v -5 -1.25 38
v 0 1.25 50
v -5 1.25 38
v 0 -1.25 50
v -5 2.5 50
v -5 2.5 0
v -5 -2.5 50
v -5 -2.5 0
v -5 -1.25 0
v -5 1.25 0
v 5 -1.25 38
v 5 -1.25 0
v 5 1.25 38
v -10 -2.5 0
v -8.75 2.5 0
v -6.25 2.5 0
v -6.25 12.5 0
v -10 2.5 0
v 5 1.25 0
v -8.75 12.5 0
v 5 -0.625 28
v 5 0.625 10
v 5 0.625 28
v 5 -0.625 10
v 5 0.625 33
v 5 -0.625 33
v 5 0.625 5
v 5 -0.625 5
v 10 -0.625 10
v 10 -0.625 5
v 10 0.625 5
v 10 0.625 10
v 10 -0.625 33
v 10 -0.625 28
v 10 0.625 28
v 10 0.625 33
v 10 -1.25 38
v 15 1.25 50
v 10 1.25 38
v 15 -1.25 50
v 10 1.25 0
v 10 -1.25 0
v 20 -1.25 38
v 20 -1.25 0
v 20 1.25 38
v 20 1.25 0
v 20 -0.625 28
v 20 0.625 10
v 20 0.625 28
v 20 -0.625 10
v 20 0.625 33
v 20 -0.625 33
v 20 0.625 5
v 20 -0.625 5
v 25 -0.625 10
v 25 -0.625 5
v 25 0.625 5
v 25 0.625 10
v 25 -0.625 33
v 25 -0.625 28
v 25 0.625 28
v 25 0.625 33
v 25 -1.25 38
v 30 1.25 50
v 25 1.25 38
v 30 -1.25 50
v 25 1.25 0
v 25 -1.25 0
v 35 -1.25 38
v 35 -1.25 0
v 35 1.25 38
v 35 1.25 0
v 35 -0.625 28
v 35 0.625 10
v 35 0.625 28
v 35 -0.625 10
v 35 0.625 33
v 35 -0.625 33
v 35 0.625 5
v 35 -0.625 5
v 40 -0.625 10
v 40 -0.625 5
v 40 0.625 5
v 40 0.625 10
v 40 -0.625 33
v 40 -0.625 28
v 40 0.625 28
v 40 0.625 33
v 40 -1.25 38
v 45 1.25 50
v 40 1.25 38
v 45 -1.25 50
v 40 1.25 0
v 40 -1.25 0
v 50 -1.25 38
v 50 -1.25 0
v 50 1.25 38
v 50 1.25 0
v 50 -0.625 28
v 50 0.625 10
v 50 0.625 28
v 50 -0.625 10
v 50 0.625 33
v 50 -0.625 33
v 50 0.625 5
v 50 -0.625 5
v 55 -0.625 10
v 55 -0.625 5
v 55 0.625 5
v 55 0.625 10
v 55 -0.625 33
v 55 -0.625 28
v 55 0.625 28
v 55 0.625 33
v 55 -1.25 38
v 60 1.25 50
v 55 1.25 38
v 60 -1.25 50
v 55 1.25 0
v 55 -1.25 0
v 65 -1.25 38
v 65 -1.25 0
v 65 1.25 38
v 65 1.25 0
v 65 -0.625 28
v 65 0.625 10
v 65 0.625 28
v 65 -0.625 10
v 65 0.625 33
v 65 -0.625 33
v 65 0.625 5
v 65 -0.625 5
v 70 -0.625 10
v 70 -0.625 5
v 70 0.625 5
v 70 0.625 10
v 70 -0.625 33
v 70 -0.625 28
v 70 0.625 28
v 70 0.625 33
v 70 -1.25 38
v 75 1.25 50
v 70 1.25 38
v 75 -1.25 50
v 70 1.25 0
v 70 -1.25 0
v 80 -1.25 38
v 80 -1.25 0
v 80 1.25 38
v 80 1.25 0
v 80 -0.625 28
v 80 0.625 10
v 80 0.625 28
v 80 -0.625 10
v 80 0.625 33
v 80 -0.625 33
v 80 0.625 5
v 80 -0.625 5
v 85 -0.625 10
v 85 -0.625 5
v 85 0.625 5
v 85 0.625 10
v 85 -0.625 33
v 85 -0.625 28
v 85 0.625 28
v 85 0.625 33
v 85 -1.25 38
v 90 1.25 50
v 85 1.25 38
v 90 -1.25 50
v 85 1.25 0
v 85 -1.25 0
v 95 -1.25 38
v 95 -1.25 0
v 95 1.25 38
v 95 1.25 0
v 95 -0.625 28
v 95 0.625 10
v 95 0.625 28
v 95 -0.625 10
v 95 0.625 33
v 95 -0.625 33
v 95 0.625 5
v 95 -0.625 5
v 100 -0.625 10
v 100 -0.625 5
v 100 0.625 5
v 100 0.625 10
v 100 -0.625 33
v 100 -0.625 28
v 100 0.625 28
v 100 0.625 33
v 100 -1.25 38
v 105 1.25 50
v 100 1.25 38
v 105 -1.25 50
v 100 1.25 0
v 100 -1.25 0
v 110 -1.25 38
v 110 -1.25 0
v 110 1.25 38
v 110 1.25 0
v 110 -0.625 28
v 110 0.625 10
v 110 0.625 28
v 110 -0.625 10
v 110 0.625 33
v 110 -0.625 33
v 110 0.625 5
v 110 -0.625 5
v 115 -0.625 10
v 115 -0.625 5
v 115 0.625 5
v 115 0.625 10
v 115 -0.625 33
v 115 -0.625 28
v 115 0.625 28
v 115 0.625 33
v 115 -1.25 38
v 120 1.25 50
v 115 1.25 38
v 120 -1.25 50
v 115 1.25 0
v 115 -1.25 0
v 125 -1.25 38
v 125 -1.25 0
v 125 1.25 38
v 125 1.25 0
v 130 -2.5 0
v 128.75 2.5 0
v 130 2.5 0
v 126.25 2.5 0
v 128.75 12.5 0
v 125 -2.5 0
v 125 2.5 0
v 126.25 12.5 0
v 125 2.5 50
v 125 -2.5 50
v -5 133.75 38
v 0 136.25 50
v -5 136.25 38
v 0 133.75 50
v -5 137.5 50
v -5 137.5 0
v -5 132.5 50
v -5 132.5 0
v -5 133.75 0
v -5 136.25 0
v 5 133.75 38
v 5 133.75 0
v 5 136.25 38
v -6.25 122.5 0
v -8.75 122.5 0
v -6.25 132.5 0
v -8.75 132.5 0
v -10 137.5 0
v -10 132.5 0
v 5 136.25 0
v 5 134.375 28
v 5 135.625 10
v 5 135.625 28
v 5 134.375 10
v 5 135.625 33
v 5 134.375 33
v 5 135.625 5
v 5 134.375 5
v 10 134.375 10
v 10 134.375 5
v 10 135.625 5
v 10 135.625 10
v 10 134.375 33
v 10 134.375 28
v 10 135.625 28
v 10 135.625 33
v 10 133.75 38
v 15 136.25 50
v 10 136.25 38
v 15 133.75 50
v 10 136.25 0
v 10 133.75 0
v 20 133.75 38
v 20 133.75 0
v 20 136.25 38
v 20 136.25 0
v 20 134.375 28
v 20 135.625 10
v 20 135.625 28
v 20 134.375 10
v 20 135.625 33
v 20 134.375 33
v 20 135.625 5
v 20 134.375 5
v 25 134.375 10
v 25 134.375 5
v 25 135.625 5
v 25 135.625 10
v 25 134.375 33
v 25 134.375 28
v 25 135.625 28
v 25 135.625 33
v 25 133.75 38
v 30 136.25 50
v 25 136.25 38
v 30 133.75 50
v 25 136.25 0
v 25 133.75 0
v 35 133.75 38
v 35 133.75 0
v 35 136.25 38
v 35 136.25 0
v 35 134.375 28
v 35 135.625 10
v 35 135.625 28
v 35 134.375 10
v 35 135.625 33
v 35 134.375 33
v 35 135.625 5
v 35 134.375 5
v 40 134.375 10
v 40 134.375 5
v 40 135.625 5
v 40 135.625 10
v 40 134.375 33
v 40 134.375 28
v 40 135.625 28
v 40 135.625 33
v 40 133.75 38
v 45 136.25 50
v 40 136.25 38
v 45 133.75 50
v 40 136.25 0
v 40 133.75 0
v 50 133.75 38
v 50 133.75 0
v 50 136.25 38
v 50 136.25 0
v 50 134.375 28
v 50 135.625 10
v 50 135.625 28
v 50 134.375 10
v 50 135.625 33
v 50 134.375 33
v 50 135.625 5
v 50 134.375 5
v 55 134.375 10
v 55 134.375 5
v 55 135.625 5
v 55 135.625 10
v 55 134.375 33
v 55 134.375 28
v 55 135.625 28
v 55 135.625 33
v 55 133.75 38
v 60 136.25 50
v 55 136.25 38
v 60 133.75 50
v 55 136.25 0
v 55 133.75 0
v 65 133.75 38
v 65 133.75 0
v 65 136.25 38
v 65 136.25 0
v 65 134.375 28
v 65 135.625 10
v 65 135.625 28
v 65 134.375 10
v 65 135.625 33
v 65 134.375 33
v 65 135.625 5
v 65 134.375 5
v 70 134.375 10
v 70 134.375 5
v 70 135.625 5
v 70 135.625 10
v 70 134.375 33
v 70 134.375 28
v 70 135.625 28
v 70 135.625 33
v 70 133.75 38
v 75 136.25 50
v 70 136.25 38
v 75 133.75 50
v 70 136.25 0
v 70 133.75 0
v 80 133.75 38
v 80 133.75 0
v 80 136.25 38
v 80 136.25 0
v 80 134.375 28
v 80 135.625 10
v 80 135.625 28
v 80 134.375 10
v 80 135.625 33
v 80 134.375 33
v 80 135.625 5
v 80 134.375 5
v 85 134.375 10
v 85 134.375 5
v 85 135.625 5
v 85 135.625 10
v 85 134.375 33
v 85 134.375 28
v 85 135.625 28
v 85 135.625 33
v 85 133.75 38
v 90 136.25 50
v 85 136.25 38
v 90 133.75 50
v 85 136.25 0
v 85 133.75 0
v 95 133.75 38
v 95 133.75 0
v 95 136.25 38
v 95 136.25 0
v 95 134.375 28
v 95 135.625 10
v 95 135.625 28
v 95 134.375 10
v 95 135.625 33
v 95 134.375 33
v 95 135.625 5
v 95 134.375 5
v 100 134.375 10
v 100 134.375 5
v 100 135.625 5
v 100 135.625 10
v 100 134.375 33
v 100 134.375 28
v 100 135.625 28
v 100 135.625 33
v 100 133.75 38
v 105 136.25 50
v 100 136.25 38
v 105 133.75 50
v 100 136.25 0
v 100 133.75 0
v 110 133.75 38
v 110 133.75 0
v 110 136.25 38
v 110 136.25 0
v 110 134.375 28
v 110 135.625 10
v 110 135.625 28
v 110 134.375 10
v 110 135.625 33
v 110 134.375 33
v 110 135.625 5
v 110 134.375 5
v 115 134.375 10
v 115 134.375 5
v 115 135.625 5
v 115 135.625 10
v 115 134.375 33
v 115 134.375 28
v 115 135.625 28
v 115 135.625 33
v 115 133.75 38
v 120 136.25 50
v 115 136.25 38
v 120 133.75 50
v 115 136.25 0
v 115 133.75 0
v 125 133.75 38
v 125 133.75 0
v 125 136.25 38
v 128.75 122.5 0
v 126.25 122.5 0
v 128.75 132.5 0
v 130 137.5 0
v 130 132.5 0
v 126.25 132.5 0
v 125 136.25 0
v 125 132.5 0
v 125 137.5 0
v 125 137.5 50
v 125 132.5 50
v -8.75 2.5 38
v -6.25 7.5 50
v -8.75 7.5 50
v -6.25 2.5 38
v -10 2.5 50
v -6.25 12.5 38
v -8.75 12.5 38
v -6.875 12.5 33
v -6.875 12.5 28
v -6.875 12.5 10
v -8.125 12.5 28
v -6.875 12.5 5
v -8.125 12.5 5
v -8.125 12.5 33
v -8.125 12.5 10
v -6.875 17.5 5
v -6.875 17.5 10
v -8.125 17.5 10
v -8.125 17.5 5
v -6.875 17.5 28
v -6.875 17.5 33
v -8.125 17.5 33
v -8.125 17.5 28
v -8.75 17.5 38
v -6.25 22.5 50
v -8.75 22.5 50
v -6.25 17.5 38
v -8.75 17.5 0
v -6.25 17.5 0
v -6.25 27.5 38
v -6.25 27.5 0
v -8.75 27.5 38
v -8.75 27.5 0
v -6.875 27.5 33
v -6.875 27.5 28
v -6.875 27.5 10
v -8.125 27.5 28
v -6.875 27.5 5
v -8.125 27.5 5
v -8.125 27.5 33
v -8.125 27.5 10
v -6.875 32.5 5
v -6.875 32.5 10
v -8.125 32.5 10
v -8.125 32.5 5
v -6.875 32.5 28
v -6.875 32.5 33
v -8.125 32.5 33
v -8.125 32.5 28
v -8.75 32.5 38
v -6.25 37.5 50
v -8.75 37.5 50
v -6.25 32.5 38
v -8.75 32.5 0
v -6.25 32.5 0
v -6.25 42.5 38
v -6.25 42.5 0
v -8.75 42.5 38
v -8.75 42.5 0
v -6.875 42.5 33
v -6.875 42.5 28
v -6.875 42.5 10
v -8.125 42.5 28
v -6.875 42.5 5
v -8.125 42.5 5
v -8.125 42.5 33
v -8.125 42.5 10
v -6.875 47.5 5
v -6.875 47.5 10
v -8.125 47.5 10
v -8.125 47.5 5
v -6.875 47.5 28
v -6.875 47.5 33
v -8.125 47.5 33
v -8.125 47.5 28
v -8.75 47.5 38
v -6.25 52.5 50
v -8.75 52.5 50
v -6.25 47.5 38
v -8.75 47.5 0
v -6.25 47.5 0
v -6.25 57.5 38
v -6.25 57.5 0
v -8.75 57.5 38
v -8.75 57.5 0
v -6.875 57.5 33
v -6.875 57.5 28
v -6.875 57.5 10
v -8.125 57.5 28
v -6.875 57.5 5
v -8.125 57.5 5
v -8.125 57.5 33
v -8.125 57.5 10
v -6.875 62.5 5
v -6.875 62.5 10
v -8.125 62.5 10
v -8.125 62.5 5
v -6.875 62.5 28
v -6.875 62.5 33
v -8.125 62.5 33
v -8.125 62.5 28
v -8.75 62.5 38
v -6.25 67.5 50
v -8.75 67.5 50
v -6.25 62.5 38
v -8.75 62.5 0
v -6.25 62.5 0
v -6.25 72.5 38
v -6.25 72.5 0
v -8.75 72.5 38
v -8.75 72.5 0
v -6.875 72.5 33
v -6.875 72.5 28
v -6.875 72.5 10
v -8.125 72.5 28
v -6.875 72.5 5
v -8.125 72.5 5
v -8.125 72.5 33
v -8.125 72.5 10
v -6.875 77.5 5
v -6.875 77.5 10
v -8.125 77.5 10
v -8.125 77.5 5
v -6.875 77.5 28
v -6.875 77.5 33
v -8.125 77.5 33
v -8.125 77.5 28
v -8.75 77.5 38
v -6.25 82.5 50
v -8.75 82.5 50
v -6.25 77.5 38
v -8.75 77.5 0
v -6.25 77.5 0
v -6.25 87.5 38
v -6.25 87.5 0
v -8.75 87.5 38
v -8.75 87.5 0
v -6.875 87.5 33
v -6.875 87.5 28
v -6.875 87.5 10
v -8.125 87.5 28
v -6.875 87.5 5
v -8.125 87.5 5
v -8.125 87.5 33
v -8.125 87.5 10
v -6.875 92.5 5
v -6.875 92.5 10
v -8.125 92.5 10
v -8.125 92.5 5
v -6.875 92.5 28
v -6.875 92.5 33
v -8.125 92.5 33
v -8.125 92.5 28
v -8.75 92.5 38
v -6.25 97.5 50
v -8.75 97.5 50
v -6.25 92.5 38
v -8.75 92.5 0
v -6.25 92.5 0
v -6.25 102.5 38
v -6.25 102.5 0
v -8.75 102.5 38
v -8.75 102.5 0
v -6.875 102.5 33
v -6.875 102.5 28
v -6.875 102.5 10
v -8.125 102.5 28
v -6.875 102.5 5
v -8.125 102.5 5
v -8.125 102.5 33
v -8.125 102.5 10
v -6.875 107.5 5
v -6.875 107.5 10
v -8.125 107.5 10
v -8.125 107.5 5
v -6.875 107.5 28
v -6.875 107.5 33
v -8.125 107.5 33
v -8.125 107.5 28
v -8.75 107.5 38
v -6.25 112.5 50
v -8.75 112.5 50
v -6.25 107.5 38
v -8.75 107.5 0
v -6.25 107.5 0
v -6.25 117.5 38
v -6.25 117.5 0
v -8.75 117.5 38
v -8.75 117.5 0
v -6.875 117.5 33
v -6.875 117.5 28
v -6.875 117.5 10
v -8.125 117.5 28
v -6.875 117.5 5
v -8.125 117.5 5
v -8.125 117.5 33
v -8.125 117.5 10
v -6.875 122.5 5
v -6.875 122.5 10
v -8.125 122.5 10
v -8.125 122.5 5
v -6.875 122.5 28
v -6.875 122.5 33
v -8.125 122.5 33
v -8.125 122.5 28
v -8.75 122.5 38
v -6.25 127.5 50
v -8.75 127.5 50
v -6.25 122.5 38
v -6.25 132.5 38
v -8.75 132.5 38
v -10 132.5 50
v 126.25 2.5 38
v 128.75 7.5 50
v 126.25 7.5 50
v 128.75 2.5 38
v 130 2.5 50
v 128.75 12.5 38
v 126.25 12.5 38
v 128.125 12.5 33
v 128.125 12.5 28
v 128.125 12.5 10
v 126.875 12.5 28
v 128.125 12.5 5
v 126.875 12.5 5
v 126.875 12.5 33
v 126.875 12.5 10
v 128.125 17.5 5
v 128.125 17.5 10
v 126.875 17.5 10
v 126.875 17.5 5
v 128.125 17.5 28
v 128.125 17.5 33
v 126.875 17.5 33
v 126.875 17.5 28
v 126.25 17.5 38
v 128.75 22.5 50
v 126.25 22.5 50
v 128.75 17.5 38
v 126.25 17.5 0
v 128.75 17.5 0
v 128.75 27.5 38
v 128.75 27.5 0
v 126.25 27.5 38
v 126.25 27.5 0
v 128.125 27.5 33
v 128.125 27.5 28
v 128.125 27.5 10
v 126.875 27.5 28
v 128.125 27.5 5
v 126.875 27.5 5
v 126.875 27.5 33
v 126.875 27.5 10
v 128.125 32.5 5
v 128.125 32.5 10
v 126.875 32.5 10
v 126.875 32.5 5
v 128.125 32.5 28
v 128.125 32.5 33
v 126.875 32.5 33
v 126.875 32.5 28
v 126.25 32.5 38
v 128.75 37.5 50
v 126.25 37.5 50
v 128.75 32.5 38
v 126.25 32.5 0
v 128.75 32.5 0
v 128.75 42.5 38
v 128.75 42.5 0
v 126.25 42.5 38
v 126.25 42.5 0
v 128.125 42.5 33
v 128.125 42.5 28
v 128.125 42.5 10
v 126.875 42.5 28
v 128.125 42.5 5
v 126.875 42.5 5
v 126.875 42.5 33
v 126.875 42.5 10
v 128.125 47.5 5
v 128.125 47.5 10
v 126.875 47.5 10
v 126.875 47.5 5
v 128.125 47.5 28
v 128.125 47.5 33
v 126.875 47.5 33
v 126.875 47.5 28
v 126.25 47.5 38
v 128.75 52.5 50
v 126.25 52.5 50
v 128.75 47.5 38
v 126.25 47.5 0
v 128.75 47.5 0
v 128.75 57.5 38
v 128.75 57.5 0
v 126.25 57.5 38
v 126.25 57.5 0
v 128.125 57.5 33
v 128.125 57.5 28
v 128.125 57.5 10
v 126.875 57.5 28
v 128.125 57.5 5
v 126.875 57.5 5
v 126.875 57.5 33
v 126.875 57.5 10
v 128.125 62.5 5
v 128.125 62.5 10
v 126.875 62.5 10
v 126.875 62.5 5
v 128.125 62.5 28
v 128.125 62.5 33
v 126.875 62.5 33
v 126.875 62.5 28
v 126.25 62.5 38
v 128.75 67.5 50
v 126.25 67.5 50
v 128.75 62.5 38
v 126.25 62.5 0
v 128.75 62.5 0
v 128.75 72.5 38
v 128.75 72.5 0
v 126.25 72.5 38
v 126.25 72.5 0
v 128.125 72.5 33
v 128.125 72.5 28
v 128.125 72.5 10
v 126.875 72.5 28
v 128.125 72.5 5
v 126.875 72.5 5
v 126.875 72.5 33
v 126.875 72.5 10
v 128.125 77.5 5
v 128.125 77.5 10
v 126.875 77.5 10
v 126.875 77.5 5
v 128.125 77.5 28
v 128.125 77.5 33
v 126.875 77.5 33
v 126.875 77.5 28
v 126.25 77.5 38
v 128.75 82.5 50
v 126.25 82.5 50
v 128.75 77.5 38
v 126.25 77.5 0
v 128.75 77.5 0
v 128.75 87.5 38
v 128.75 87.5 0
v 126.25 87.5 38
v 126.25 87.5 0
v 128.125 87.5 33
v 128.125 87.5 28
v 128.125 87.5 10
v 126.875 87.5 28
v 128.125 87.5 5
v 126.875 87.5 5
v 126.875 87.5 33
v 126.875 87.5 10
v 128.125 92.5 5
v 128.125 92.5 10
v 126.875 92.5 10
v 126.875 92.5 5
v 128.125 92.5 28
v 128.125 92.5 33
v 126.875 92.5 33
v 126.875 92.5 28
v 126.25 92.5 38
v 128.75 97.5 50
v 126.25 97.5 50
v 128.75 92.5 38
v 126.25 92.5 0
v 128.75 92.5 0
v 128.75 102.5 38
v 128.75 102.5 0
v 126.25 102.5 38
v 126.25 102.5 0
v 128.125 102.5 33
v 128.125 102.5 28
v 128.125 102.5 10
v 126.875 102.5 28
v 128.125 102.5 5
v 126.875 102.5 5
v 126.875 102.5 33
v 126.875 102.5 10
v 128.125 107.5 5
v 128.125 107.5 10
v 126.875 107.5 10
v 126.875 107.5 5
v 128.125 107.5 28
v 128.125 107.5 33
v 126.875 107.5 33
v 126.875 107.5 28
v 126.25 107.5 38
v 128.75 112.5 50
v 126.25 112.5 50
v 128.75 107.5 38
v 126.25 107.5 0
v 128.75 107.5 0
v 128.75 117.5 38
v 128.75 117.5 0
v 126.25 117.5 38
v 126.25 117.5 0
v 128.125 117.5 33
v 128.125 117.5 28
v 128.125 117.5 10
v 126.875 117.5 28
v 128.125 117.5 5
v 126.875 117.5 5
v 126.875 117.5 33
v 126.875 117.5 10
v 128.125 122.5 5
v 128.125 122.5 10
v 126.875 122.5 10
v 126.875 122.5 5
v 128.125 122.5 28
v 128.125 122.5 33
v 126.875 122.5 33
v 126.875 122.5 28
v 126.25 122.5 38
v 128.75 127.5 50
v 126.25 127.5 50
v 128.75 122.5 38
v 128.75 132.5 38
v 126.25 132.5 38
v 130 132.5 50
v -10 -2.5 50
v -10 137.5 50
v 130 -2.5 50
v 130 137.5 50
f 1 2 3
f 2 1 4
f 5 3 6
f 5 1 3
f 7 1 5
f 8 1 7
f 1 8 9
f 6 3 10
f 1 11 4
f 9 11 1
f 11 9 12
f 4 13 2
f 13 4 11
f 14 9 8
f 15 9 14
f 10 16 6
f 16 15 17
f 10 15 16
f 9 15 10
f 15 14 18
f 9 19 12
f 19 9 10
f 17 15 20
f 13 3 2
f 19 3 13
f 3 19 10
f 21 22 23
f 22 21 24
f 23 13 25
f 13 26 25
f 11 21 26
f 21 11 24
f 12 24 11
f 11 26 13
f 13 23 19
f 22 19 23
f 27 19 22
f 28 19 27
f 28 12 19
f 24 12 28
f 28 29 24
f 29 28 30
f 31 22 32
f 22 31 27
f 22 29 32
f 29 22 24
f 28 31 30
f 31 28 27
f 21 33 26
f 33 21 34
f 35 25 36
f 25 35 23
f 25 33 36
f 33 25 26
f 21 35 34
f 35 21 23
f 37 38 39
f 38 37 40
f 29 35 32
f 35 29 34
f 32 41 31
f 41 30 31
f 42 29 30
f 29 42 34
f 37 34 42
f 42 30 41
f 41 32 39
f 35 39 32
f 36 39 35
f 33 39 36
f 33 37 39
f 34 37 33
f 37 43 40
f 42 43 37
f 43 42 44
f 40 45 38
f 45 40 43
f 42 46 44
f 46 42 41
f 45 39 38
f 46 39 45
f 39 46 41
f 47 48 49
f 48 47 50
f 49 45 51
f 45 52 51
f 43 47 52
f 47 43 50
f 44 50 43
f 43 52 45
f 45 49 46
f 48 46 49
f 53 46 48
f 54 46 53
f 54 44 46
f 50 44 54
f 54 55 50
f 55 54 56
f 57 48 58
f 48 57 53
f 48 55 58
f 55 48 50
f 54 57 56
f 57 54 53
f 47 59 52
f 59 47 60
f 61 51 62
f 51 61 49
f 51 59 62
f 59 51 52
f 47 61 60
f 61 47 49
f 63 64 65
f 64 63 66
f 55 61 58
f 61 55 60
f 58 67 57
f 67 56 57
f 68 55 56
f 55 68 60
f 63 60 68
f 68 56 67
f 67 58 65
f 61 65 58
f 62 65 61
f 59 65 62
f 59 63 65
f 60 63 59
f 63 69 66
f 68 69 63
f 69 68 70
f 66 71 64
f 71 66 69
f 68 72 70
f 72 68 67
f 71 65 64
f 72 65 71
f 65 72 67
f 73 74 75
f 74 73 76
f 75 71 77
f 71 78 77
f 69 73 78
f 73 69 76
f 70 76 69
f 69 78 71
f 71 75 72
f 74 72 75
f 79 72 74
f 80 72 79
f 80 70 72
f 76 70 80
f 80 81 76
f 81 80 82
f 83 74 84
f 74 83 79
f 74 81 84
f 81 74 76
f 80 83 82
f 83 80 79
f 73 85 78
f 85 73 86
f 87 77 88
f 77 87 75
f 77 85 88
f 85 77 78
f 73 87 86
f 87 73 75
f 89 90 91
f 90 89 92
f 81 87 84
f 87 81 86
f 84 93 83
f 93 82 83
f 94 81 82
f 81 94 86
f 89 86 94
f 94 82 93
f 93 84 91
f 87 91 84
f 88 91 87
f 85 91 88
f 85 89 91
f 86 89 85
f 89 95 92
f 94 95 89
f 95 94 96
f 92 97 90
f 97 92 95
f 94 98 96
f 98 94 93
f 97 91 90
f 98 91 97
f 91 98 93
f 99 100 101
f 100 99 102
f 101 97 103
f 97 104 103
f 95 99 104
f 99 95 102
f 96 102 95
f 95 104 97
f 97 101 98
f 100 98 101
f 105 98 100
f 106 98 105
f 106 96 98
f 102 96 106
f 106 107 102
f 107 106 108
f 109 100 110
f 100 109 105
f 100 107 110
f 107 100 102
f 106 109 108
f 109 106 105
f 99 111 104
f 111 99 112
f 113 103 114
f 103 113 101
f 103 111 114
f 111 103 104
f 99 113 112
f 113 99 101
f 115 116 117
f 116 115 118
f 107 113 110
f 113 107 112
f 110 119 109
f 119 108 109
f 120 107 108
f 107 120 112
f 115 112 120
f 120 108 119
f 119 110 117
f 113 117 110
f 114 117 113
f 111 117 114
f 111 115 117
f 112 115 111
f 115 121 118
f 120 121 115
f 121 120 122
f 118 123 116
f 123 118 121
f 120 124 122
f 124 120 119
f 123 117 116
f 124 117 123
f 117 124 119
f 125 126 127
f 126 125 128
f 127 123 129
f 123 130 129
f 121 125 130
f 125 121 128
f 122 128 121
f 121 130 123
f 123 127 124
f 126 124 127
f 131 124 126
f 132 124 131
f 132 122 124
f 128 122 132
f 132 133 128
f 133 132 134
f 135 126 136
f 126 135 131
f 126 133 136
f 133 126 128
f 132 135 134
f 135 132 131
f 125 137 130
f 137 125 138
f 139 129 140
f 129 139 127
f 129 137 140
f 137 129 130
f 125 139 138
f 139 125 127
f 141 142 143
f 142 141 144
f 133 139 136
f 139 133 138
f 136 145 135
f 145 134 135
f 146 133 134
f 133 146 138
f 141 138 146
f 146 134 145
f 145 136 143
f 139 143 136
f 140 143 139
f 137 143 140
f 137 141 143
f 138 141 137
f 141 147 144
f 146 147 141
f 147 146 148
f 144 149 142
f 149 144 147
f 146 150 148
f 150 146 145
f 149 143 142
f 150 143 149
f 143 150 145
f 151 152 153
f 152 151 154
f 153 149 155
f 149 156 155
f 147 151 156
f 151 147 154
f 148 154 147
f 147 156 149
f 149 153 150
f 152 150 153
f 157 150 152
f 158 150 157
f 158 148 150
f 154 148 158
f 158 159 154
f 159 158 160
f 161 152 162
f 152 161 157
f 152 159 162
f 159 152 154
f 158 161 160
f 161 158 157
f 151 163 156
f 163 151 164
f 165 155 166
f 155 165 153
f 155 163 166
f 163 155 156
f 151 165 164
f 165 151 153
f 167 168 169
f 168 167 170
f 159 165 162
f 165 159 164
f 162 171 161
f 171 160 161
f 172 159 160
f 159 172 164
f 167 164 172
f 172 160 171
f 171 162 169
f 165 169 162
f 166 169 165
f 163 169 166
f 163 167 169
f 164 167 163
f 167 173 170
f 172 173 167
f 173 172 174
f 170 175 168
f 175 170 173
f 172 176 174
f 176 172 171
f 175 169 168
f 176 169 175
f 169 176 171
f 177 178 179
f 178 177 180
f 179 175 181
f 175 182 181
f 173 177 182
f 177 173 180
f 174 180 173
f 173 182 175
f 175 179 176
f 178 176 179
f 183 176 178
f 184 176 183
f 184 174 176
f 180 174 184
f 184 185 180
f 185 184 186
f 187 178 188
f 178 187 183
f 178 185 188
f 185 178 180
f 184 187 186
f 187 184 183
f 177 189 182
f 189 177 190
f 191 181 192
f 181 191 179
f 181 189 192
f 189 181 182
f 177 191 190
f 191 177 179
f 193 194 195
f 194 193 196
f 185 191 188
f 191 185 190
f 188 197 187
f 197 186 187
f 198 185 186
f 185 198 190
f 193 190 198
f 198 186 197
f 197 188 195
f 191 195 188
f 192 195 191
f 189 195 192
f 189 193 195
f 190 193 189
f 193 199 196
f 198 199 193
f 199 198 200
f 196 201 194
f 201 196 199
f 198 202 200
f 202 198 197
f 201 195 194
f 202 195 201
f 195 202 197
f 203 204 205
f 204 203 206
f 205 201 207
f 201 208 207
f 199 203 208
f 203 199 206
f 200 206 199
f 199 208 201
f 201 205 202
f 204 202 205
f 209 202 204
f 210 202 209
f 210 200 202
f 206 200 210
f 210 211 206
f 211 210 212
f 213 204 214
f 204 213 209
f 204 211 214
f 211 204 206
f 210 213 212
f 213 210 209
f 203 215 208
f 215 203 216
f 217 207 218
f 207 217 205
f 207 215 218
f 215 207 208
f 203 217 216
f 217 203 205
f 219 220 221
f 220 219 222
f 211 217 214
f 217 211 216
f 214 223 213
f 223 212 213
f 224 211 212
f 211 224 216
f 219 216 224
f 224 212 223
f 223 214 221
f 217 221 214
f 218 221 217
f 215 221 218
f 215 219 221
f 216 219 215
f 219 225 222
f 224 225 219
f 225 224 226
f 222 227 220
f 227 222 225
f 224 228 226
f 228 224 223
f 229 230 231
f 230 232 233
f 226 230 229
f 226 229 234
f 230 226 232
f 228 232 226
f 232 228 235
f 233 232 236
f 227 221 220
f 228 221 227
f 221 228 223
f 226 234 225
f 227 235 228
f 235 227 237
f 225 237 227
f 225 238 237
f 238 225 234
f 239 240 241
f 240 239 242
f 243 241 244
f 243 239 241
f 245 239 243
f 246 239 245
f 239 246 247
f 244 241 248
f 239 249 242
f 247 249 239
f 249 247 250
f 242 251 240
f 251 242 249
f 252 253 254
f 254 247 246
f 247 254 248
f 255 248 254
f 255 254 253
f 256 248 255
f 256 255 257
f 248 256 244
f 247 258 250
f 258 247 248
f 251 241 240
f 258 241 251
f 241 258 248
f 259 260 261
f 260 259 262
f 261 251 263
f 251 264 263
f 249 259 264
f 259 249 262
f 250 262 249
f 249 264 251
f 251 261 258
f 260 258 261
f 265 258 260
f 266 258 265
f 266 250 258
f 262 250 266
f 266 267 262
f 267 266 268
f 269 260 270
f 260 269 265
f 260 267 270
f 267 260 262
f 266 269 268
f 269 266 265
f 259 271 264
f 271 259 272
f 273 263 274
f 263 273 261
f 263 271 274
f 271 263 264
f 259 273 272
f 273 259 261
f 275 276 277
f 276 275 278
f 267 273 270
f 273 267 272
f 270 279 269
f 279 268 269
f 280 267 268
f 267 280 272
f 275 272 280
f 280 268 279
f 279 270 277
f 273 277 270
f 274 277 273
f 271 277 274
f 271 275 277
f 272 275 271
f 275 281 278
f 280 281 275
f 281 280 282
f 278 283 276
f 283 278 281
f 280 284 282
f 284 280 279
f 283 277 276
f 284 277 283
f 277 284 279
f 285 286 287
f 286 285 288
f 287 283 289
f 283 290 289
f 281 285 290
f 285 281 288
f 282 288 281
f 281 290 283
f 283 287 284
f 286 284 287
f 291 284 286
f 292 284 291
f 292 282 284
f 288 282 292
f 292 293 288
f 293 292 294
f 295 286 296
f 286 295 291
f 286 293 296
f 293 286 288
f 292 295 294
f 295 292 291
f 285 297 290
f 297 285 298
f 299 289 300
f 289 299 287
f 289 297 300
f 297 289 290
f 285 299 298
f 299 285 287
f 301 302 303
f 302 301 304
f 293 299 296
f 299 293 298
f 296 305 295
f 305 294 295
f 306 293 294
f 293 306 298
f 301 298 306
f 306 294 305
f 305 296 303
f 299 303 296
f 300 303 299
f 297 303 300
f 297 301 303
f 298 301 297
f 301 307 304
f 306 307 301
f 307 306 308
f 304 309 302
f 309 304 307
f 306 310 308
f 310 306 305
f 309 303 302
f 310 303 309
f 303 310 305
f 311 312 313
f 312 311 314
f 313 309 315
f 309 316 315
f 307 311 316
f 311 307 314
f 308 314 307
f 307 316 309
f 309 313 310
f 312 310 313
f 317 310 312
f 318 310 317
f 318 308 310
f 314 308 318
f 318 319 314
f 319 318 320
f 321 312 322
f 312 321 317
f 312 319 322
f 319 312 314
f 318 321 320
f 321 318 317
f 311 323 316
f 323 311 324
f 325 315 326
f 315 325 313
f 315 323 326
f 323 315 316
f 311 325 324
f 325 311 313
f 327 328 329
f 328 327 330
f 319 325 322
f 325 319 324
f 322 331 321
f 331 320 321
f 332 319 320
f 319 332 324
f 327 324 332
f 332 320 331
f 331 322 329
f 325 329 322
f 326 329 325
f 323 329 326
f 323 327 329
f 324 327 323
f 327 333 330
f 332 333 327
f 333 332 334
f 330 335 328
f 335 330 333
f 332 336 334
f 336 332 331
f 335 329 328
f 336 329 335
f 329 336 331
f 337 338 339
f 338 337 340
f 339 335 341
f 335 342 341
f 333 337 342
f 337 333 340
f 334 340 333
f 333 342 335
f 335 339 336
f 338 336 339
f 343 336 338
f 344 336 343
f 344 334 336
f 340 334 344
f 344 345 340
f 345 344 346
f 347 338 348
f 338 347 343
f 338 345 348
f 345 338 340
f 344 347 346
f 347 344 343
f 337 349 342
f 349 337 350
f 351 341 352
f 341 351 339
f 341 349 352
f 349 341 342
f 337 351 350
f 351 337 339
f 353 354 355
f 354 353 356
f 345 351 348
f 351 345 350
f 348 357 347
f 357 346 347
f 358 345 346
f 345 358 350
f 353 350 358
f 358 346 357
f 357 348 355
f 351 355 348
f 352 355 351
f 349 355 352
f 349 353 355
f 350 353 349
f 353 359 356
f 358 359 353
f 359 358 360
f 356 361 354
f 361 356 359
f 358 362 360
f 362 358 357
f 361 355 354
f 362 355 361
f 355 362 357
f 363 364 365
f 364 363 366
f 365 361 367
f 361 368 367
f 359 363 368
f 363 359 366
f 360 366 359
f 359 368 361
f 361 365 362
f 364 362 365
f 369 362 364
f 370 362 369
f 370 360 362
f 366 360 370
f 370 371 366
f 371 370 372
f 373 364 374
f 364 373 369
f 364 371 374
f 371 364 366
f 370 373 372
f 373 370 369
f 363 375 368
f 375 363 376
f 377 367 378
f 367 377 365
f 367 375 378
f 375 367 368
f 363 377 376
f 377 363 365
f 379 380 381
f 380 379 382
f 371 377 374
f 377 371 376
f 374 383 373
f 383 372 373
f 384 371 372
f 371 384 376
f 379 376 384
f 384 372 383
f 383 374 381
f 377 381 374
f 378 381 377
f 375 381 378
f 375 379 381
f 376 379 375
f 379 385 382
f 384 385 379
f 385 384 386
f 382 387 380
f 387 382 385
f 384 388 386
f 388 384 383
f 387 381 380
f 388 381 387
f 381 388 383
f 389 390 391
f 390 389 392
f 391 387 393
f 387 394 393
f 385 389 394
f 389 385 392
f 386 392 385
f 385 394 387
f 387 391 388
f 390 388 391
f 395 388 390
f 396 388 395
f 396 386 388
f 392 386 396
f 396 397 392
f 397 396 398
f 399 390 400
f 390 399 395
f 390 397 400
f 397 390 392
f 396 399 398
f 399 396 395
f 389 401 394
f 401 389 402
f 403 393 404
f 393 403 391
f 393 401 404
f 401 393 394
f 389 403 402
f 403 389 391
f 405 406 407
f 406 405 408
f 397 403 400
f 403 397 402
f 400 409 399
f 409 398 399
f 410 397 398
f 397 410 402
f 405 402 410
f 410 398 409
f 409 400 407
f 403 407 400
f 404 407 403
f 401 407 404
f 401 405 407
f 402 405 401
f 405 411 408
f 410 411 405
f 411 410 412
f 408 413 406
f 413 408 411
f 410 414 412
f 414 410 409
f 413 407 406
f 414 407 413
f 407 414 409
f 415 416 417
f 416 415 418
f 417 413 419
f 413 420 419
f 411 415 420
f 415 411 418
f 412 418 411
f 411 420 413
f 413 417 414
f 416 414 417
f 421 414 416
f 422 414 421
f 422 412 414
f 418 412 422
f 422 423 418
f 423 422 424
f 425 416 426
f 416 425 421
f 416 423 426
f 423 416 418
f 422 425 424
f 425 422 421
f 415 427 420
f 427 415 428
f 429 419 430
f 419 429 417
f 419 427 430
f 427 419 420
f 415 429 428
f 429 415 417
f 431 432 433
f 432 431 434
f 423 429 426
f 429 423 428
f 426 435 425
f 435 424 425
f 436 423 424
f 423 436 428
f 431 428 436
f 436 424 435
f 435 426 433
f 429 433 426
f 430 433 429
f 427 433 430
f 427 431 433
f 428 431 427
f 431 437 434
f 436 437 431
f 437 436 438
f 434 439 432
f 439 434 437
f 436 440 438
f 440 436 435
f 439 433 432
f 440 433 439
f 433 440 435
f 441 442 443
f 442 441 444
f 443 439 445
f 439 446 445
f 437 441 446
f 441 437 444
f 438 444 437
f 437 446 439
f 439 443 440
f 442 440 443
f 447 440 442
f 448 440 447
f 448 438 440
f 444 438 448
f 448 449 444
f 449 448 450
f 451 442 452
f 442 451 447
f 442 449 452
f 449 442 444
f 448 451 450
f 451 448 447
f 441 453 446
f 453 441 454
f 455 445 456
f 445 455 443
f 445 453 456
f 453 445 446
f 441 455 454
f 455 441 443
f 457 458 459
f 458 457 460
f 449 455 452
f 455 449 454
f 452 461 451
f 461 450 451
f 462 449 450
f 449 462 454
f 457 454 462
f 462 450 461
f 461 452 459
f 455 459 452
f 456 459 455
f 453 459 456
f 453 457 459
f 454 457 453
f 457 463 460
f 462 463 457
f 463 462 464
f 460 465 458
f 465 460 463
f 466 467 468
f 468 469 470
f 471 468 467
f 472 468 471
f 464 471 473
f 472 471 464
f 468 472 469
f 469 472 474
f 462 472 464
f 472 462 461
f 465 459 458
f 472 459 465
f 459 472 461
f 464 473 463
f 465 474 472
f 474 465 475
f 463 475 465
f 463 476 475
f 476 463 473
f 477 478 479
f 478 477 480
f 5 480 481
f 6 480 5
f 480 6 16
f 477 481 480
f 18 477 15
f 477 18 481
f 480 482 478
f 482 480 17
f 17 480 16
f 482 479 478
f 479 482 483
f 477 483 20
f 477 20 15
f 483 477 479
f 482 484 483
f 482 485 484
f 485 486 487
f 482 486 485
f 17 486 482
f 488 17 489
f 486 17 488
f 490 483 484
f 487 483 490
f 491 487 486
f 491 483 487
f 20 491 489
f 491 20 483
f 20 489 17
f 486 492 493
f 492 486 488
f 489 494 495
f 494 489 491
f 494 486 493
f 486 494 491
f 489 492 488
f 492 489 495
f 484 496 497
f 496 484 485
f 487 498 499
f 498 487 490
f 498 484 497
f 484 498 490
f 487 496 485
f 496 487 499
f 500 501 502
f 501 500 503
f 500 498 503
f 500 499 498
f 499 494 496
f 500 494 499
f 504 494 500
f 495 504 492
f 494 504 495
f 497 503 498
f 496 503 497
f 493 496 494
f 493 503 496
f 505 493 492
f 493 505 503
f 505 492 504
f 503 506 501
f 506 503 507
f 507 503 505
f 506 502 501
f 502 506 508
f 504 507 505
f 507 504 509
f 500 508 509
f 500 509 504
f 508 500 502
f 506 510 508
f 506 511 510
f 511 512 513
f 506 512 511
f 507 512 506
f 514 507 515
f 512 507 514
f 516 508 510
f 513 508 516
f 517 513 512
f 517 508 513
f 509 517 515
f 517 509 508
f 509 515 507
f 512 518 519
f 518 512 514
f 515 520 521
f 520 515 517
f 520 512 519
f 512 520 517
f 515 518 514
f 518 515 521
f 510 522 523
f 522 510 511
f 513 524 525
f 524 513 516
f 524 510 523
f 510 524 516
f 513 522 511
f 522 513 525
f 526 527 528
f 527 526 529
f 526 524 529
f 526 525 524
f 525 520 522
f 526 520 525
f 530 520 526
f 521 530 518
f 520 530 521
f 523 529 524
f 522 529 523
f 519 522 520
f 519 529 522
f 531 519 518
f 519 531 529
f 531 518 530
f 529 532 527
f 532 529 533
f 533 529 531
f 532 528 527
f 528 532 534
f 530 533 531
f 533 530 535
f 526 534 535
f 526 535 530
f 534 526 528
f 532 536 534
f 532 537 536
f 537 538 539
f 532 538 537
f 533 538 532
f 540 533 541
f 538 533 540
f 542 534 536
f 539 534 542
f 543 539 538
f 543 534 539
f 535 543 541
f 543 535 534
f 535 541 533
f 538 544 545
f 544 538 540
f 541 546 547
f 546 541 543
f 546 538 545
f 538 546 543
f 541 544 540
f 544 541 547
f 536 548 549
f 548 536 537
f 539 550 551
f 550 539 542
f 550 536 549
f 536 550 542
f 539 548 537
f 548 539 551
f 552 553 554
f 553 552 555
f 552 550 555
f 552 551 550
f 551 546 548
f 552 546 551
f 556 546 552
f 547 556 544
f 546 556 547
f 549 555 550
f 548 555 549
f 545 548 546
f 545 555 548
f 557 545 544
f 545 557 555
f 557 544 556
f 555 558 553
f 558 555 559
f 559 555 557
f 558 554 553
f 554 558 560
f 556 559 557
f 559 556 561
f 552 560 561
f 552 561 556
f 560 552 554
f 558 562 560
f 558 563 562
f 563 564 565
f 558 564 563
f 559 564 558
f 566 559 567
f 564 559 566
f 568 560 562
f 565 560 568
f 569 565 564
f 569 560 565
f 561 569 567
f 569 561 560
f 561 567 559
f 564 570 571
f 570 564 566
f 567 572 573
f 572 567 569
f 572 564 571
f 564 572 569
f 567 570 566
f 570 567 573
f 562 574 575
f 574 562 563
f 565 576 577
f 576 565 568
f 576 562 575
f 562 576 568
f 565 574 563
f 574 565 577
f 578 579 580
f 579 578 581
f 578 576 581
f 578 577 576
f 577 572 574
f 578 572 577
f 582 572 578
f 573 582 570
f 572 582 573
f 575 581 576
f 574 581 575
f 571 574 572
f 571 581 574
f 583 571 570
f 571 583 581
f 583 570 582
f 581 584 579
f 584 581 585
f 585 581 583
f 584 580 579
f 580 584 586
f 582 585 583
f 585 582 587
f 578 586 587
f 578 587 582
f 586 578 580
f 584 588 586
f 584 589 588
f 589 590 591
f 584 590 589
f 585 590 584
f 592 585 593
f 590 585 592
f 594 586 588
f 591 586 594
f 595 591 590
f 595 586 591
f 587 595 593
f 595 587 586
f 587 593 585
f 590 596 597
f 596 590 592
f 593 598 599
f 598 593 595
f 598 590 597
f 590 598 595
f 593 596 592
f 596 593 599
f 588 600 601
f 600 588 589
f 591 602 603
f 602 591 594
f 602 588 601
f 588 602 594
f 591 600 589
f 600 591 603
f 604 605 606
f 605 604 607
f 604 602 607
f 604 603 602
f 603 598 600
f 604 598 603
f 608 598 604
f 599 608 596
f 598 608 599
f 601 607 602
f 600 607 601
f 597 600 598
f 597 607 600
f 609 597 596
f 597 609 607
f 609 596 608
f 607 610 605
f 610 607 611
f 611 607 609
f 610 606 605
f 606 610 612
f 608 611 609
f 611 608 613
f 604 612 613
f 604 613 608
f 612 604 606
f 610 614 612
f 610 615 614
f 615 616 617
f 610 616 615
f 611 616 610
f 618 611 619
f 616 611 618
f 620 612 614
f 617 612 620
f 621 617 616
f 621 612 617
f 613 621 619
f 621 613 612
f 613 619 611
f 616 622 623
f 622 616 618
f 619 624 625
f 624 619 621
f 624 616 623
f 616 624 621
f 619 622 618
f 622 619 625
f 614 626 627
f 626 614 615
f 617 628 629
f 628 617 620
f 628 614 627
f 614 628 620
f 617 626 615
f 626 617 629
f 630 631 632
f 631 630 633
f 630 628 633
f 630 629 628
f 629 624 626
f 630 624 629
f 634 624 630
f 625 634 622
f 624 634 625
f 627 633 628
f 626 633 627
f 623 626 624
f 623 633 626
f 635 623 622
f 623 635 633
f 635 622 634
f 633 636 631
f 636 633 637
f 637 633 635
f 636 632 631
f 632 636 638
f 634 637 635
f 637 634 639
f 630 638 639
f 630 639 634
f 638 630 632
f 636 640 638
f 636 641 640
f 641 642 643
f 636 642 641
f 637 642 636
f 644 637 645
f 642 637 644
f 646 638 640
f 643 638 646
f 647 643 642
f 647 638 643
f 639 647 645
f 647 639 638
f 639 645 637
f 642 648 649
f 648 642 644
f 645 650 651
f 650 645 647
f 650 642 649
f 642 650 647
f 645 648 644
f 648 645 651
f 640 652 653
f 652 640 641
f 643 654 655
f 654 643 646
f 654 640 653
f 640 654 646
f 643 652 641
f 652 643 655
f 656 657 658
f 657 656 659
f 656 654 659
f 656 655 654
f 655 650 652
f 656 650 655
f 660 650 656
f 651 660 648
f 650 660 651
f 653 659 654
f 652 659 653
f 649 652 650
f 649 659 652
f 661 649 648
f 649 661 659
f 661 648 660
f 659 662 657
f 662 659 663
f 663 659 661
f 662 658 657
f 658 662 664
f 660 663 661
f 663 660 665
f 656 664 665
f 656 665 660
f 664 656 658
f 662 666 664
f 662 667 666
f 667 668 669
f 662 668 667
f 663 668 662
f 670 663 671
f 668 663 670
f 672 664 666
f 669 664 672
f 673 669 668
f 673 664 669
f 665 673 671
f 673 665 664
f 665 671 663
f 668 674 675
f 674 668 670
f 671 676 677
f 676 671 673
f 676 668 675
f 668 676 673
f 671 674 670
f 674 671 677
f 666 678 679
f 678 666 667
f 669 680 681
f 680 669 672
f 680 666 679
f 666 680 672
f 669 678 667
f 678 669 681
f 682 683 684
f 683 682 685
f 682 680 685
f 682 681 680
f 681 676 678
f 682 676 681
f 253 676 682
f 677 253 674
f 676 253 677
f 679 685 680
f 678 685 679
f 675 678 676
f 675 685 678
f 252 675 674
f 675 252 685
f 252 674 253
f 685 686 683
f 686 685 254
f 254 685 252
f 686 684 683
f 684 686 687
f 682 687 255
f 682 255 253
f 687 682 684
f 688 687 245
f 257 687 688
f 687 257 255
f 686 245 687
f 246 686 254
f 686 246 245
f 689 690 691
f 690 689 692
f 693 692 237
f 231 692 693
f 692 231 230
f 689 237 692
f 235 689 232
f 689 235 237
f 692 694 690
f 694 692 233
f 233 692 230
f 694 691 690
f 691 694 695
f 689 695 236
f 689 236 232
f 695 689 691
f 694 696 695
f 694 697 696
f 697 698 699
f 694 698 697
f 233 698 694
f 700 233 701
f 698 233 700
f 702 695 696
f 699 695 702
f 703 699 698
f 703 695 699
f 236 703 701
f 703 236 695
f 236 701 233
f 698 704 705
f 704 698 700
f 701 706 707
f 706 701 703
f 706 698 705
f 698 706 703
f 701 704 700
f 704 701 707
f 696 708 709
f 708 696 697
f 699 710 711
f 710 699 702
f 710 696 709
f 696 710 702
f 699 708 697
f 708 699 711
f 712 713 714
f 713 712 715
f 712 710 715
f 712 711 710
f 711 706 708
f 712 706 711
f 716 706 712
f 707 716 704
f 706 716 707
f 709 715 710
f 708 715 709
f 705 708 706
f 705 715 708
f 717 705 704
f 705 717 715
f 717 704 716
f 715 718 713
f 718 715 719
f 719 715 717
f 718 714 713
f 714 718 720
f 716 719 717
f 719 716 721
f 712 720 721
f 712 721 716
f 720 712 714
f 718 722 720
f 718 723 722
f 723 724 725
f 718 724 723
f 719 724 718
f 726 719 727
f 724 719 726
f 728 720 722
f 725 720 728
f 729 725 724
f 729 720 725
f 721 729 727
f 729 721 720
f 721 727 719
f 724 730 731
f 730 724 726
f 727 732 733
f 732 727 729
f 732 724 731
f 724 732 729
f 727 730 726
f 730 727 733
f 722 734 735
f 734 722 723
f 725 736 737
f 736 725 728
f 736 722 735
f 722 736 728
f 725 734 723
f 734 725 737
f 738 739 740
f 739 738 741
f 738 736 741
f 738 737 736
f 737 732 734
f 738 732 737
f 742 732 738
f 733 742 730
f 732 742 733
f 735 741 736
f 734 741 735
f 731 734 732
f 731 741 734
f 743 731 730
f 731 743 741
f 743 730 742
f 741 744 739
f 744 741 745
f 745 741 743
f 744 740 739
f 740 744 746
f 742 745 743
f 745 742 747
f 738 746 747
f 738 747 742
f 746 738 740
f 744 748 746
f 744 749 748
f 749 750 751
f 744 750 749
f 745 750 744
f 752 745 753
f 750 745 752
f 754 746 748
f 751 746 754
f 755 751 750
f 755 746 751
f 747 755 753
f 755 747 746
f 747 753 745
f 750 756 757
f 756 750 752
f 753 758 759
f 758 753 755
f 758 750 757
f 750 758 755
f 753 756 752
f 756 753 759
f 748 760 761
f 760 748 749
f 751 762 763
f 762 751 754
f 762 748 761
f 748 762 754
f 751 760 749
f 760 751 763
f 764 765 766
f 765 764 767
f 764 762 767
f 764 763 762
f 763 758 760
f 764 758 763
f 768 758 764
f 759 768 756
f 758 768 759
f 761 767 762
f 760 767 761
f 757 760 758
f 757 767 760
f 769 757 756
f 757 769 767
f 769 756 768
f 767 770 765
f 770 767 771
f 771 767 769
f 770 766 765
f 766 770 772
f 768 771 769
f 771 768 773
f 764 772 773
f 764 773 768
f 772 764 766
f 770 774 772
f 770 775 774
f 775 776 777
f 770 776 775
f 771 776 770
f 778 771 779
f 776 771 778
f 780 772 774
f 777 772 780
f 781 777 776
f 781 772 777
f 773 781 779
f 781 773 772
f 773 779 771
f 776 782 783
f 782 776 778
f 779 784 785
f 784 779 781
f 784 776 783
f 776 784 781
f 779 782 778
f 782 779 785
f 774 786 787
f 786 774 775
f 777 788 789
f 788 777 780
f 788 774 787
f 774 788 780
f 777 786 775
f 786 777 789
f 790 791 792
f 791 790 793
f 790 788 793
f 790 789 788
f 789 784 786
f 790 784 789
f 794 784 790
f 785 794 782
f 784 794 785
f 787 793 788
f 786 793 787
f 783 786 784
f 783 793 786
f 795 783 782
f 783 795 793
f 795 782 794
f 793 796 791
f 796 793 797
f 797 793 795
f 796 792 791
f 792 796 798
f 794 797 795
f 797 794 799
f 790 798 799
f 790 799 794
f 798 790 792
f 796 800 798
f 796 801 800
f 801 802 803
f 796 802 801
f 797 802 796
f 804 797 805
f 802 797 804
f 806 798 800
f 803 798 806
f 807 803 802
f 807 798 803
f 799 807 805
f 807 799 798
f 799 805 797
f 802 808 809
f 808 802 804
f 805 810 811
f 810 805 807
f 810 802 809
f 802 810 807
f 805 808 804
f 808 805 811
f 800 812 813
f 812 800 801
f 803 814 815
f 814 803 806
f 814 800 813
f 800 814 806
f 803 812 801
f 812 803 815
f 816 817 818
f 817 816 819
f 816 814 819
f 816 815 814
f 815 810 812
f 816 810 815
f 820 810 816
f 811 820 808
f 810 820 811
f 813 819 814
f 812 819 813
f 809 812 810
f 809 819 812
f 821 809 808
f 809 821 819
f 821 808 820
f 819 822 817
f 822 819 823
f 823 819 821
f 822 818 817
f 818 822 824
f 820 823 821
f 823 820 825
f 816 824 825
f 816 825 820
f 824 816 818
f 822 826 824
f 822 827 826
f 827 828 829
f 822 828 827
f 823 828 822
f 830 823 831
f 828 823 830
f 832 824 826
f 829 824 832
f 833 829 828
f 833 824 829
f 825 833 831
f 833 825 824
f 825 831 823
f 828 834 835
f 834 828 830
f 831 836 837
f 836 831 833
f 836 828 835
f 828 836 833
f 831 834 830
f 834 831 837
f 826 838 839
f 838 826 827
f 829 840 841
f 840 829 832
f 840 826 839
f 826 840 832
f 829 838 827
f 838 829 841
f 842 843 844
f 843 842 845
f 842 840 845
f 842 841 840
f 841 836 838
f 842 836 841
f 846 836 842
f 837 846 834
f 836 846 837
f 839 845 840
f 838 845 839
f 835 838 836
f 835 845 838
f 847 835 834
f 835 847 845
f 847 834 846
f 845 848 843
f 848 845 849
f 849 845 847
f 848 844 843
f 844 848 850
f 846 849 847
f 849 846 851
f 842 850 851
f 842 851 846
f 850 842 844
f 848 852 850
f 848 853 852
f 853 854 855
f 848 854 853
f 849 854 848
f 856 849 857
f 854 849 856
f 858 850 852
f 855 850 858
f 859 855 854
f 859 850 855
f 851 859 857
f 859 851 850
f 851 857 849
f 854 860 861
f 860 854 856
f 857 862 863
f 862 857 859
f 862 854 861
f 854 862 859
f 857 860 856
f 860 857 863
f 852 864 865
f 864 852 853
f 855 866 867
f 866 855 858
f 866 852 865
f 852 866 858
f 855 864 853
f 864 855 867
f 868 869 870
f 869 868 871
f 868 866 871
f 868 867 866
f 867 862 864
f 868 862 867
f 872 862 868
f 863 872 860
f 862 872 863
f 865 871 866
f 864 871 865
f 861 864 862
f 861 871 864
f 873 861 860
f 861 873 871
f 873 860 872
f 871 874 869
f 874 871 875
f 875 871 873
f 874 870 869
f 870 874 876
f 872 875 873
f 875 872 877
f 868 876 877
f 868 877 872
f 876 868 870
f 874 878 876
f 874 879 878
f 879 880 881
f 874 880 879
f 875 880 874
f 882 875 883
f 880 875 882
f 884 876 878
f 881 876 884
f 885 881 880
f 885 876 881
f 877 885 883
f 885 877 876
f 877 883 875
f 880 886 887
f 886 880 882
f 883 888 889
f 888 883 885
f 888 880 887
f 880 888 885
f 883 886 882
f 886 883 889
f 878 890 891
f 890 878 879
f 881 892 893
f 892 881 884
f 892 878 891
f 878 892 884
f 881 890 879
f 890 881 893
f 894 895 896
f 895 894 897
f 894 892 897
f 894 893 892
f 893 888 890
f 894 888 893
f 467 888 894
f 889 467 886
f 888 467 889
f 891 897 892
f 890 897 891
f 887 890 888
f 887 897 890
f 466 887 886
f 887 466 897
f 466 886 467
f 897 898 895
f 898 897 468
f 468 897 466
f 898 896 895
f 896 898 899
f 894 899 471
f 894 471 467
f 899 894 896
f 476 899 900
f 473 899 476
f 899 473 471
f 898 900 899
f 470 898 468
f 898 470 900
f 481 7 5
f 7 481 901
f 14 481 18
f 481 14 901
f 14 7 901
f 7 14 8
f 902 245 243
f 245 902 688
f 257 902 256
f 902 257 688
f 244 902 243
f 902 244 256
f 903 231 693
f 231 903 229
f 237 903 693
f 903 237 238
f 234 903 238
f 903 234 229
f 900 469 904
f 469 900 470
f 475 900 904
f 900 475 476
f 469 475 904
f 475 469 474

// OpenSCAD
//Keep your 3D prints corralled within a nice picket fence.
//Input your printer's build size, and have a corral generated for you!

//Written by Brandon Pomeroy at intentional3D

/* [Select Your Printer Bed Size] */

// in mm. This should be slightly smaller than your max build length.
corralLength = 140;

//in mm. This should be sligthly smaller than your max build width
corralWidth = 140;

/* [Hidden] */
fencePostWidth = 10;
fencePostTaperHeight = 12;
fencePostHeight = 50;
fencePostThickness = 2.5;
fencePostSpacing = 5;

lengthNumberOfPosts = floor(corralLength/(fencePostSpacing+fencePostWidth));
widthNumberOfPosts = floor(corralWidth/(fencePostSpacing+fencePostWidth));
halfPostWidth = (fencePostWidth + fencePostSpacing)/2;

//echo(lengthNumberOfPosts);
//echo(widthNumberOfPosts);



module fencePost(x,y,z, thickness, spacing){
	cubeLength = x + spacing;
	union(){
		linear_extrude(height = thickness, center = true, convexity = 10, twist = 0)
			translate([-x/2, 0, 0])
			polygon(points = [[0,0], [x,0], [x,z-y], [x/2,z], [0,z-y]], paths = [[0,1,2,3,4]]);

		translate([-(x+spacing)/2, spacing, -thickness/4])
			cube([cubeLength, 5, thickness/2], center = false);

		translate([-(x+spacing)/2, z-y-(spacing*2), -thickness/4])
			cube([cubeLength, 5, thickness/2], center = false);
		
	}
}

module fenceLine(spacing, postWidth, length){
	numberOfPosts = floor(length/(spacing+postWidth));
	//echo(numberOfPosts);
	//echo(numberOfPosts*(spacing+postWidth));
	for( i = [1 : 1 : numberOfPosts] ) {
		translate([(spacing+postWidth)*(i-1), 0, 0])
		fencePost(fencePostWidth, fencePostTaperHeight, fencePostHeight, fencePostThickness,fencePostSpacing);
	}
}

module cornerPosts() {
	//First find the corner coordinates

	bottomLeft = [-halfPostWidth, 0, fencePostHeight/2];
	bottomRight = [lengthNumberOfPosts * (fencePostWidth+fencePostSpacing) - halfPostWidth, 0 , fencePostHeight/2];
	topLeft = [-halfPostWidth, widthNumberOfPosts * (fencePostWidth+fencePostSpacing), fencePostHeight/2];
	topRight = [lengthNumberOfPosts * (fencePostWidth+fencePostSpacing) - halfPostWidth, widthNumberOfPosts * (fencePostWidth+fencePostSpacing) , fencePostHeight/2];

	translate(bottomLeft)
		cube([fencePostSpacing,fencePostSpacing,fencePostHeight], center = true);
	translate(topLeft)
		cube([fencePostSpacing,fencePostSpacing,fencePostHeight], center = true);
	translate(bottomRight)
		cube([fencePostSpacing,fencePostSpacing,fencePostHeight], center = true);
	translate(topRight)
		cube([fencePostSpacing,fencePostSpacing,fencePostHeight], center = true);

}


module corral(){
	union(){
		translate([0,0,0])
			rotate([90,0,0])
			fenceLine(fencePostSpacing, fencePostWidth, corralLength);
	
		
		translate([0, widthNumberOfPosts * (fencePostWidth+fencePostSpacing),0])
			rotate([90,0,0])
			fenceLine(fencePostSpacing, fencePostWidth, corralLength);
	
		translate([-halfPostWidth, halfPostWidth , 0])
			rotate([90,0,90])
			fenceLine(fencePostSpacing, fencePostWidth, corralWidth);
	
		translate([lengthNumberOfPosts * (fencePostWidth+fencePostSpacing) - halfPostWidth, halfPostWidth , 0])
			rotate([90,0,90])
			fenceLine(fencePostSpacing, fencePostWidth, corralWidth);
	}

	cornerPosts();
	
}



corral();
